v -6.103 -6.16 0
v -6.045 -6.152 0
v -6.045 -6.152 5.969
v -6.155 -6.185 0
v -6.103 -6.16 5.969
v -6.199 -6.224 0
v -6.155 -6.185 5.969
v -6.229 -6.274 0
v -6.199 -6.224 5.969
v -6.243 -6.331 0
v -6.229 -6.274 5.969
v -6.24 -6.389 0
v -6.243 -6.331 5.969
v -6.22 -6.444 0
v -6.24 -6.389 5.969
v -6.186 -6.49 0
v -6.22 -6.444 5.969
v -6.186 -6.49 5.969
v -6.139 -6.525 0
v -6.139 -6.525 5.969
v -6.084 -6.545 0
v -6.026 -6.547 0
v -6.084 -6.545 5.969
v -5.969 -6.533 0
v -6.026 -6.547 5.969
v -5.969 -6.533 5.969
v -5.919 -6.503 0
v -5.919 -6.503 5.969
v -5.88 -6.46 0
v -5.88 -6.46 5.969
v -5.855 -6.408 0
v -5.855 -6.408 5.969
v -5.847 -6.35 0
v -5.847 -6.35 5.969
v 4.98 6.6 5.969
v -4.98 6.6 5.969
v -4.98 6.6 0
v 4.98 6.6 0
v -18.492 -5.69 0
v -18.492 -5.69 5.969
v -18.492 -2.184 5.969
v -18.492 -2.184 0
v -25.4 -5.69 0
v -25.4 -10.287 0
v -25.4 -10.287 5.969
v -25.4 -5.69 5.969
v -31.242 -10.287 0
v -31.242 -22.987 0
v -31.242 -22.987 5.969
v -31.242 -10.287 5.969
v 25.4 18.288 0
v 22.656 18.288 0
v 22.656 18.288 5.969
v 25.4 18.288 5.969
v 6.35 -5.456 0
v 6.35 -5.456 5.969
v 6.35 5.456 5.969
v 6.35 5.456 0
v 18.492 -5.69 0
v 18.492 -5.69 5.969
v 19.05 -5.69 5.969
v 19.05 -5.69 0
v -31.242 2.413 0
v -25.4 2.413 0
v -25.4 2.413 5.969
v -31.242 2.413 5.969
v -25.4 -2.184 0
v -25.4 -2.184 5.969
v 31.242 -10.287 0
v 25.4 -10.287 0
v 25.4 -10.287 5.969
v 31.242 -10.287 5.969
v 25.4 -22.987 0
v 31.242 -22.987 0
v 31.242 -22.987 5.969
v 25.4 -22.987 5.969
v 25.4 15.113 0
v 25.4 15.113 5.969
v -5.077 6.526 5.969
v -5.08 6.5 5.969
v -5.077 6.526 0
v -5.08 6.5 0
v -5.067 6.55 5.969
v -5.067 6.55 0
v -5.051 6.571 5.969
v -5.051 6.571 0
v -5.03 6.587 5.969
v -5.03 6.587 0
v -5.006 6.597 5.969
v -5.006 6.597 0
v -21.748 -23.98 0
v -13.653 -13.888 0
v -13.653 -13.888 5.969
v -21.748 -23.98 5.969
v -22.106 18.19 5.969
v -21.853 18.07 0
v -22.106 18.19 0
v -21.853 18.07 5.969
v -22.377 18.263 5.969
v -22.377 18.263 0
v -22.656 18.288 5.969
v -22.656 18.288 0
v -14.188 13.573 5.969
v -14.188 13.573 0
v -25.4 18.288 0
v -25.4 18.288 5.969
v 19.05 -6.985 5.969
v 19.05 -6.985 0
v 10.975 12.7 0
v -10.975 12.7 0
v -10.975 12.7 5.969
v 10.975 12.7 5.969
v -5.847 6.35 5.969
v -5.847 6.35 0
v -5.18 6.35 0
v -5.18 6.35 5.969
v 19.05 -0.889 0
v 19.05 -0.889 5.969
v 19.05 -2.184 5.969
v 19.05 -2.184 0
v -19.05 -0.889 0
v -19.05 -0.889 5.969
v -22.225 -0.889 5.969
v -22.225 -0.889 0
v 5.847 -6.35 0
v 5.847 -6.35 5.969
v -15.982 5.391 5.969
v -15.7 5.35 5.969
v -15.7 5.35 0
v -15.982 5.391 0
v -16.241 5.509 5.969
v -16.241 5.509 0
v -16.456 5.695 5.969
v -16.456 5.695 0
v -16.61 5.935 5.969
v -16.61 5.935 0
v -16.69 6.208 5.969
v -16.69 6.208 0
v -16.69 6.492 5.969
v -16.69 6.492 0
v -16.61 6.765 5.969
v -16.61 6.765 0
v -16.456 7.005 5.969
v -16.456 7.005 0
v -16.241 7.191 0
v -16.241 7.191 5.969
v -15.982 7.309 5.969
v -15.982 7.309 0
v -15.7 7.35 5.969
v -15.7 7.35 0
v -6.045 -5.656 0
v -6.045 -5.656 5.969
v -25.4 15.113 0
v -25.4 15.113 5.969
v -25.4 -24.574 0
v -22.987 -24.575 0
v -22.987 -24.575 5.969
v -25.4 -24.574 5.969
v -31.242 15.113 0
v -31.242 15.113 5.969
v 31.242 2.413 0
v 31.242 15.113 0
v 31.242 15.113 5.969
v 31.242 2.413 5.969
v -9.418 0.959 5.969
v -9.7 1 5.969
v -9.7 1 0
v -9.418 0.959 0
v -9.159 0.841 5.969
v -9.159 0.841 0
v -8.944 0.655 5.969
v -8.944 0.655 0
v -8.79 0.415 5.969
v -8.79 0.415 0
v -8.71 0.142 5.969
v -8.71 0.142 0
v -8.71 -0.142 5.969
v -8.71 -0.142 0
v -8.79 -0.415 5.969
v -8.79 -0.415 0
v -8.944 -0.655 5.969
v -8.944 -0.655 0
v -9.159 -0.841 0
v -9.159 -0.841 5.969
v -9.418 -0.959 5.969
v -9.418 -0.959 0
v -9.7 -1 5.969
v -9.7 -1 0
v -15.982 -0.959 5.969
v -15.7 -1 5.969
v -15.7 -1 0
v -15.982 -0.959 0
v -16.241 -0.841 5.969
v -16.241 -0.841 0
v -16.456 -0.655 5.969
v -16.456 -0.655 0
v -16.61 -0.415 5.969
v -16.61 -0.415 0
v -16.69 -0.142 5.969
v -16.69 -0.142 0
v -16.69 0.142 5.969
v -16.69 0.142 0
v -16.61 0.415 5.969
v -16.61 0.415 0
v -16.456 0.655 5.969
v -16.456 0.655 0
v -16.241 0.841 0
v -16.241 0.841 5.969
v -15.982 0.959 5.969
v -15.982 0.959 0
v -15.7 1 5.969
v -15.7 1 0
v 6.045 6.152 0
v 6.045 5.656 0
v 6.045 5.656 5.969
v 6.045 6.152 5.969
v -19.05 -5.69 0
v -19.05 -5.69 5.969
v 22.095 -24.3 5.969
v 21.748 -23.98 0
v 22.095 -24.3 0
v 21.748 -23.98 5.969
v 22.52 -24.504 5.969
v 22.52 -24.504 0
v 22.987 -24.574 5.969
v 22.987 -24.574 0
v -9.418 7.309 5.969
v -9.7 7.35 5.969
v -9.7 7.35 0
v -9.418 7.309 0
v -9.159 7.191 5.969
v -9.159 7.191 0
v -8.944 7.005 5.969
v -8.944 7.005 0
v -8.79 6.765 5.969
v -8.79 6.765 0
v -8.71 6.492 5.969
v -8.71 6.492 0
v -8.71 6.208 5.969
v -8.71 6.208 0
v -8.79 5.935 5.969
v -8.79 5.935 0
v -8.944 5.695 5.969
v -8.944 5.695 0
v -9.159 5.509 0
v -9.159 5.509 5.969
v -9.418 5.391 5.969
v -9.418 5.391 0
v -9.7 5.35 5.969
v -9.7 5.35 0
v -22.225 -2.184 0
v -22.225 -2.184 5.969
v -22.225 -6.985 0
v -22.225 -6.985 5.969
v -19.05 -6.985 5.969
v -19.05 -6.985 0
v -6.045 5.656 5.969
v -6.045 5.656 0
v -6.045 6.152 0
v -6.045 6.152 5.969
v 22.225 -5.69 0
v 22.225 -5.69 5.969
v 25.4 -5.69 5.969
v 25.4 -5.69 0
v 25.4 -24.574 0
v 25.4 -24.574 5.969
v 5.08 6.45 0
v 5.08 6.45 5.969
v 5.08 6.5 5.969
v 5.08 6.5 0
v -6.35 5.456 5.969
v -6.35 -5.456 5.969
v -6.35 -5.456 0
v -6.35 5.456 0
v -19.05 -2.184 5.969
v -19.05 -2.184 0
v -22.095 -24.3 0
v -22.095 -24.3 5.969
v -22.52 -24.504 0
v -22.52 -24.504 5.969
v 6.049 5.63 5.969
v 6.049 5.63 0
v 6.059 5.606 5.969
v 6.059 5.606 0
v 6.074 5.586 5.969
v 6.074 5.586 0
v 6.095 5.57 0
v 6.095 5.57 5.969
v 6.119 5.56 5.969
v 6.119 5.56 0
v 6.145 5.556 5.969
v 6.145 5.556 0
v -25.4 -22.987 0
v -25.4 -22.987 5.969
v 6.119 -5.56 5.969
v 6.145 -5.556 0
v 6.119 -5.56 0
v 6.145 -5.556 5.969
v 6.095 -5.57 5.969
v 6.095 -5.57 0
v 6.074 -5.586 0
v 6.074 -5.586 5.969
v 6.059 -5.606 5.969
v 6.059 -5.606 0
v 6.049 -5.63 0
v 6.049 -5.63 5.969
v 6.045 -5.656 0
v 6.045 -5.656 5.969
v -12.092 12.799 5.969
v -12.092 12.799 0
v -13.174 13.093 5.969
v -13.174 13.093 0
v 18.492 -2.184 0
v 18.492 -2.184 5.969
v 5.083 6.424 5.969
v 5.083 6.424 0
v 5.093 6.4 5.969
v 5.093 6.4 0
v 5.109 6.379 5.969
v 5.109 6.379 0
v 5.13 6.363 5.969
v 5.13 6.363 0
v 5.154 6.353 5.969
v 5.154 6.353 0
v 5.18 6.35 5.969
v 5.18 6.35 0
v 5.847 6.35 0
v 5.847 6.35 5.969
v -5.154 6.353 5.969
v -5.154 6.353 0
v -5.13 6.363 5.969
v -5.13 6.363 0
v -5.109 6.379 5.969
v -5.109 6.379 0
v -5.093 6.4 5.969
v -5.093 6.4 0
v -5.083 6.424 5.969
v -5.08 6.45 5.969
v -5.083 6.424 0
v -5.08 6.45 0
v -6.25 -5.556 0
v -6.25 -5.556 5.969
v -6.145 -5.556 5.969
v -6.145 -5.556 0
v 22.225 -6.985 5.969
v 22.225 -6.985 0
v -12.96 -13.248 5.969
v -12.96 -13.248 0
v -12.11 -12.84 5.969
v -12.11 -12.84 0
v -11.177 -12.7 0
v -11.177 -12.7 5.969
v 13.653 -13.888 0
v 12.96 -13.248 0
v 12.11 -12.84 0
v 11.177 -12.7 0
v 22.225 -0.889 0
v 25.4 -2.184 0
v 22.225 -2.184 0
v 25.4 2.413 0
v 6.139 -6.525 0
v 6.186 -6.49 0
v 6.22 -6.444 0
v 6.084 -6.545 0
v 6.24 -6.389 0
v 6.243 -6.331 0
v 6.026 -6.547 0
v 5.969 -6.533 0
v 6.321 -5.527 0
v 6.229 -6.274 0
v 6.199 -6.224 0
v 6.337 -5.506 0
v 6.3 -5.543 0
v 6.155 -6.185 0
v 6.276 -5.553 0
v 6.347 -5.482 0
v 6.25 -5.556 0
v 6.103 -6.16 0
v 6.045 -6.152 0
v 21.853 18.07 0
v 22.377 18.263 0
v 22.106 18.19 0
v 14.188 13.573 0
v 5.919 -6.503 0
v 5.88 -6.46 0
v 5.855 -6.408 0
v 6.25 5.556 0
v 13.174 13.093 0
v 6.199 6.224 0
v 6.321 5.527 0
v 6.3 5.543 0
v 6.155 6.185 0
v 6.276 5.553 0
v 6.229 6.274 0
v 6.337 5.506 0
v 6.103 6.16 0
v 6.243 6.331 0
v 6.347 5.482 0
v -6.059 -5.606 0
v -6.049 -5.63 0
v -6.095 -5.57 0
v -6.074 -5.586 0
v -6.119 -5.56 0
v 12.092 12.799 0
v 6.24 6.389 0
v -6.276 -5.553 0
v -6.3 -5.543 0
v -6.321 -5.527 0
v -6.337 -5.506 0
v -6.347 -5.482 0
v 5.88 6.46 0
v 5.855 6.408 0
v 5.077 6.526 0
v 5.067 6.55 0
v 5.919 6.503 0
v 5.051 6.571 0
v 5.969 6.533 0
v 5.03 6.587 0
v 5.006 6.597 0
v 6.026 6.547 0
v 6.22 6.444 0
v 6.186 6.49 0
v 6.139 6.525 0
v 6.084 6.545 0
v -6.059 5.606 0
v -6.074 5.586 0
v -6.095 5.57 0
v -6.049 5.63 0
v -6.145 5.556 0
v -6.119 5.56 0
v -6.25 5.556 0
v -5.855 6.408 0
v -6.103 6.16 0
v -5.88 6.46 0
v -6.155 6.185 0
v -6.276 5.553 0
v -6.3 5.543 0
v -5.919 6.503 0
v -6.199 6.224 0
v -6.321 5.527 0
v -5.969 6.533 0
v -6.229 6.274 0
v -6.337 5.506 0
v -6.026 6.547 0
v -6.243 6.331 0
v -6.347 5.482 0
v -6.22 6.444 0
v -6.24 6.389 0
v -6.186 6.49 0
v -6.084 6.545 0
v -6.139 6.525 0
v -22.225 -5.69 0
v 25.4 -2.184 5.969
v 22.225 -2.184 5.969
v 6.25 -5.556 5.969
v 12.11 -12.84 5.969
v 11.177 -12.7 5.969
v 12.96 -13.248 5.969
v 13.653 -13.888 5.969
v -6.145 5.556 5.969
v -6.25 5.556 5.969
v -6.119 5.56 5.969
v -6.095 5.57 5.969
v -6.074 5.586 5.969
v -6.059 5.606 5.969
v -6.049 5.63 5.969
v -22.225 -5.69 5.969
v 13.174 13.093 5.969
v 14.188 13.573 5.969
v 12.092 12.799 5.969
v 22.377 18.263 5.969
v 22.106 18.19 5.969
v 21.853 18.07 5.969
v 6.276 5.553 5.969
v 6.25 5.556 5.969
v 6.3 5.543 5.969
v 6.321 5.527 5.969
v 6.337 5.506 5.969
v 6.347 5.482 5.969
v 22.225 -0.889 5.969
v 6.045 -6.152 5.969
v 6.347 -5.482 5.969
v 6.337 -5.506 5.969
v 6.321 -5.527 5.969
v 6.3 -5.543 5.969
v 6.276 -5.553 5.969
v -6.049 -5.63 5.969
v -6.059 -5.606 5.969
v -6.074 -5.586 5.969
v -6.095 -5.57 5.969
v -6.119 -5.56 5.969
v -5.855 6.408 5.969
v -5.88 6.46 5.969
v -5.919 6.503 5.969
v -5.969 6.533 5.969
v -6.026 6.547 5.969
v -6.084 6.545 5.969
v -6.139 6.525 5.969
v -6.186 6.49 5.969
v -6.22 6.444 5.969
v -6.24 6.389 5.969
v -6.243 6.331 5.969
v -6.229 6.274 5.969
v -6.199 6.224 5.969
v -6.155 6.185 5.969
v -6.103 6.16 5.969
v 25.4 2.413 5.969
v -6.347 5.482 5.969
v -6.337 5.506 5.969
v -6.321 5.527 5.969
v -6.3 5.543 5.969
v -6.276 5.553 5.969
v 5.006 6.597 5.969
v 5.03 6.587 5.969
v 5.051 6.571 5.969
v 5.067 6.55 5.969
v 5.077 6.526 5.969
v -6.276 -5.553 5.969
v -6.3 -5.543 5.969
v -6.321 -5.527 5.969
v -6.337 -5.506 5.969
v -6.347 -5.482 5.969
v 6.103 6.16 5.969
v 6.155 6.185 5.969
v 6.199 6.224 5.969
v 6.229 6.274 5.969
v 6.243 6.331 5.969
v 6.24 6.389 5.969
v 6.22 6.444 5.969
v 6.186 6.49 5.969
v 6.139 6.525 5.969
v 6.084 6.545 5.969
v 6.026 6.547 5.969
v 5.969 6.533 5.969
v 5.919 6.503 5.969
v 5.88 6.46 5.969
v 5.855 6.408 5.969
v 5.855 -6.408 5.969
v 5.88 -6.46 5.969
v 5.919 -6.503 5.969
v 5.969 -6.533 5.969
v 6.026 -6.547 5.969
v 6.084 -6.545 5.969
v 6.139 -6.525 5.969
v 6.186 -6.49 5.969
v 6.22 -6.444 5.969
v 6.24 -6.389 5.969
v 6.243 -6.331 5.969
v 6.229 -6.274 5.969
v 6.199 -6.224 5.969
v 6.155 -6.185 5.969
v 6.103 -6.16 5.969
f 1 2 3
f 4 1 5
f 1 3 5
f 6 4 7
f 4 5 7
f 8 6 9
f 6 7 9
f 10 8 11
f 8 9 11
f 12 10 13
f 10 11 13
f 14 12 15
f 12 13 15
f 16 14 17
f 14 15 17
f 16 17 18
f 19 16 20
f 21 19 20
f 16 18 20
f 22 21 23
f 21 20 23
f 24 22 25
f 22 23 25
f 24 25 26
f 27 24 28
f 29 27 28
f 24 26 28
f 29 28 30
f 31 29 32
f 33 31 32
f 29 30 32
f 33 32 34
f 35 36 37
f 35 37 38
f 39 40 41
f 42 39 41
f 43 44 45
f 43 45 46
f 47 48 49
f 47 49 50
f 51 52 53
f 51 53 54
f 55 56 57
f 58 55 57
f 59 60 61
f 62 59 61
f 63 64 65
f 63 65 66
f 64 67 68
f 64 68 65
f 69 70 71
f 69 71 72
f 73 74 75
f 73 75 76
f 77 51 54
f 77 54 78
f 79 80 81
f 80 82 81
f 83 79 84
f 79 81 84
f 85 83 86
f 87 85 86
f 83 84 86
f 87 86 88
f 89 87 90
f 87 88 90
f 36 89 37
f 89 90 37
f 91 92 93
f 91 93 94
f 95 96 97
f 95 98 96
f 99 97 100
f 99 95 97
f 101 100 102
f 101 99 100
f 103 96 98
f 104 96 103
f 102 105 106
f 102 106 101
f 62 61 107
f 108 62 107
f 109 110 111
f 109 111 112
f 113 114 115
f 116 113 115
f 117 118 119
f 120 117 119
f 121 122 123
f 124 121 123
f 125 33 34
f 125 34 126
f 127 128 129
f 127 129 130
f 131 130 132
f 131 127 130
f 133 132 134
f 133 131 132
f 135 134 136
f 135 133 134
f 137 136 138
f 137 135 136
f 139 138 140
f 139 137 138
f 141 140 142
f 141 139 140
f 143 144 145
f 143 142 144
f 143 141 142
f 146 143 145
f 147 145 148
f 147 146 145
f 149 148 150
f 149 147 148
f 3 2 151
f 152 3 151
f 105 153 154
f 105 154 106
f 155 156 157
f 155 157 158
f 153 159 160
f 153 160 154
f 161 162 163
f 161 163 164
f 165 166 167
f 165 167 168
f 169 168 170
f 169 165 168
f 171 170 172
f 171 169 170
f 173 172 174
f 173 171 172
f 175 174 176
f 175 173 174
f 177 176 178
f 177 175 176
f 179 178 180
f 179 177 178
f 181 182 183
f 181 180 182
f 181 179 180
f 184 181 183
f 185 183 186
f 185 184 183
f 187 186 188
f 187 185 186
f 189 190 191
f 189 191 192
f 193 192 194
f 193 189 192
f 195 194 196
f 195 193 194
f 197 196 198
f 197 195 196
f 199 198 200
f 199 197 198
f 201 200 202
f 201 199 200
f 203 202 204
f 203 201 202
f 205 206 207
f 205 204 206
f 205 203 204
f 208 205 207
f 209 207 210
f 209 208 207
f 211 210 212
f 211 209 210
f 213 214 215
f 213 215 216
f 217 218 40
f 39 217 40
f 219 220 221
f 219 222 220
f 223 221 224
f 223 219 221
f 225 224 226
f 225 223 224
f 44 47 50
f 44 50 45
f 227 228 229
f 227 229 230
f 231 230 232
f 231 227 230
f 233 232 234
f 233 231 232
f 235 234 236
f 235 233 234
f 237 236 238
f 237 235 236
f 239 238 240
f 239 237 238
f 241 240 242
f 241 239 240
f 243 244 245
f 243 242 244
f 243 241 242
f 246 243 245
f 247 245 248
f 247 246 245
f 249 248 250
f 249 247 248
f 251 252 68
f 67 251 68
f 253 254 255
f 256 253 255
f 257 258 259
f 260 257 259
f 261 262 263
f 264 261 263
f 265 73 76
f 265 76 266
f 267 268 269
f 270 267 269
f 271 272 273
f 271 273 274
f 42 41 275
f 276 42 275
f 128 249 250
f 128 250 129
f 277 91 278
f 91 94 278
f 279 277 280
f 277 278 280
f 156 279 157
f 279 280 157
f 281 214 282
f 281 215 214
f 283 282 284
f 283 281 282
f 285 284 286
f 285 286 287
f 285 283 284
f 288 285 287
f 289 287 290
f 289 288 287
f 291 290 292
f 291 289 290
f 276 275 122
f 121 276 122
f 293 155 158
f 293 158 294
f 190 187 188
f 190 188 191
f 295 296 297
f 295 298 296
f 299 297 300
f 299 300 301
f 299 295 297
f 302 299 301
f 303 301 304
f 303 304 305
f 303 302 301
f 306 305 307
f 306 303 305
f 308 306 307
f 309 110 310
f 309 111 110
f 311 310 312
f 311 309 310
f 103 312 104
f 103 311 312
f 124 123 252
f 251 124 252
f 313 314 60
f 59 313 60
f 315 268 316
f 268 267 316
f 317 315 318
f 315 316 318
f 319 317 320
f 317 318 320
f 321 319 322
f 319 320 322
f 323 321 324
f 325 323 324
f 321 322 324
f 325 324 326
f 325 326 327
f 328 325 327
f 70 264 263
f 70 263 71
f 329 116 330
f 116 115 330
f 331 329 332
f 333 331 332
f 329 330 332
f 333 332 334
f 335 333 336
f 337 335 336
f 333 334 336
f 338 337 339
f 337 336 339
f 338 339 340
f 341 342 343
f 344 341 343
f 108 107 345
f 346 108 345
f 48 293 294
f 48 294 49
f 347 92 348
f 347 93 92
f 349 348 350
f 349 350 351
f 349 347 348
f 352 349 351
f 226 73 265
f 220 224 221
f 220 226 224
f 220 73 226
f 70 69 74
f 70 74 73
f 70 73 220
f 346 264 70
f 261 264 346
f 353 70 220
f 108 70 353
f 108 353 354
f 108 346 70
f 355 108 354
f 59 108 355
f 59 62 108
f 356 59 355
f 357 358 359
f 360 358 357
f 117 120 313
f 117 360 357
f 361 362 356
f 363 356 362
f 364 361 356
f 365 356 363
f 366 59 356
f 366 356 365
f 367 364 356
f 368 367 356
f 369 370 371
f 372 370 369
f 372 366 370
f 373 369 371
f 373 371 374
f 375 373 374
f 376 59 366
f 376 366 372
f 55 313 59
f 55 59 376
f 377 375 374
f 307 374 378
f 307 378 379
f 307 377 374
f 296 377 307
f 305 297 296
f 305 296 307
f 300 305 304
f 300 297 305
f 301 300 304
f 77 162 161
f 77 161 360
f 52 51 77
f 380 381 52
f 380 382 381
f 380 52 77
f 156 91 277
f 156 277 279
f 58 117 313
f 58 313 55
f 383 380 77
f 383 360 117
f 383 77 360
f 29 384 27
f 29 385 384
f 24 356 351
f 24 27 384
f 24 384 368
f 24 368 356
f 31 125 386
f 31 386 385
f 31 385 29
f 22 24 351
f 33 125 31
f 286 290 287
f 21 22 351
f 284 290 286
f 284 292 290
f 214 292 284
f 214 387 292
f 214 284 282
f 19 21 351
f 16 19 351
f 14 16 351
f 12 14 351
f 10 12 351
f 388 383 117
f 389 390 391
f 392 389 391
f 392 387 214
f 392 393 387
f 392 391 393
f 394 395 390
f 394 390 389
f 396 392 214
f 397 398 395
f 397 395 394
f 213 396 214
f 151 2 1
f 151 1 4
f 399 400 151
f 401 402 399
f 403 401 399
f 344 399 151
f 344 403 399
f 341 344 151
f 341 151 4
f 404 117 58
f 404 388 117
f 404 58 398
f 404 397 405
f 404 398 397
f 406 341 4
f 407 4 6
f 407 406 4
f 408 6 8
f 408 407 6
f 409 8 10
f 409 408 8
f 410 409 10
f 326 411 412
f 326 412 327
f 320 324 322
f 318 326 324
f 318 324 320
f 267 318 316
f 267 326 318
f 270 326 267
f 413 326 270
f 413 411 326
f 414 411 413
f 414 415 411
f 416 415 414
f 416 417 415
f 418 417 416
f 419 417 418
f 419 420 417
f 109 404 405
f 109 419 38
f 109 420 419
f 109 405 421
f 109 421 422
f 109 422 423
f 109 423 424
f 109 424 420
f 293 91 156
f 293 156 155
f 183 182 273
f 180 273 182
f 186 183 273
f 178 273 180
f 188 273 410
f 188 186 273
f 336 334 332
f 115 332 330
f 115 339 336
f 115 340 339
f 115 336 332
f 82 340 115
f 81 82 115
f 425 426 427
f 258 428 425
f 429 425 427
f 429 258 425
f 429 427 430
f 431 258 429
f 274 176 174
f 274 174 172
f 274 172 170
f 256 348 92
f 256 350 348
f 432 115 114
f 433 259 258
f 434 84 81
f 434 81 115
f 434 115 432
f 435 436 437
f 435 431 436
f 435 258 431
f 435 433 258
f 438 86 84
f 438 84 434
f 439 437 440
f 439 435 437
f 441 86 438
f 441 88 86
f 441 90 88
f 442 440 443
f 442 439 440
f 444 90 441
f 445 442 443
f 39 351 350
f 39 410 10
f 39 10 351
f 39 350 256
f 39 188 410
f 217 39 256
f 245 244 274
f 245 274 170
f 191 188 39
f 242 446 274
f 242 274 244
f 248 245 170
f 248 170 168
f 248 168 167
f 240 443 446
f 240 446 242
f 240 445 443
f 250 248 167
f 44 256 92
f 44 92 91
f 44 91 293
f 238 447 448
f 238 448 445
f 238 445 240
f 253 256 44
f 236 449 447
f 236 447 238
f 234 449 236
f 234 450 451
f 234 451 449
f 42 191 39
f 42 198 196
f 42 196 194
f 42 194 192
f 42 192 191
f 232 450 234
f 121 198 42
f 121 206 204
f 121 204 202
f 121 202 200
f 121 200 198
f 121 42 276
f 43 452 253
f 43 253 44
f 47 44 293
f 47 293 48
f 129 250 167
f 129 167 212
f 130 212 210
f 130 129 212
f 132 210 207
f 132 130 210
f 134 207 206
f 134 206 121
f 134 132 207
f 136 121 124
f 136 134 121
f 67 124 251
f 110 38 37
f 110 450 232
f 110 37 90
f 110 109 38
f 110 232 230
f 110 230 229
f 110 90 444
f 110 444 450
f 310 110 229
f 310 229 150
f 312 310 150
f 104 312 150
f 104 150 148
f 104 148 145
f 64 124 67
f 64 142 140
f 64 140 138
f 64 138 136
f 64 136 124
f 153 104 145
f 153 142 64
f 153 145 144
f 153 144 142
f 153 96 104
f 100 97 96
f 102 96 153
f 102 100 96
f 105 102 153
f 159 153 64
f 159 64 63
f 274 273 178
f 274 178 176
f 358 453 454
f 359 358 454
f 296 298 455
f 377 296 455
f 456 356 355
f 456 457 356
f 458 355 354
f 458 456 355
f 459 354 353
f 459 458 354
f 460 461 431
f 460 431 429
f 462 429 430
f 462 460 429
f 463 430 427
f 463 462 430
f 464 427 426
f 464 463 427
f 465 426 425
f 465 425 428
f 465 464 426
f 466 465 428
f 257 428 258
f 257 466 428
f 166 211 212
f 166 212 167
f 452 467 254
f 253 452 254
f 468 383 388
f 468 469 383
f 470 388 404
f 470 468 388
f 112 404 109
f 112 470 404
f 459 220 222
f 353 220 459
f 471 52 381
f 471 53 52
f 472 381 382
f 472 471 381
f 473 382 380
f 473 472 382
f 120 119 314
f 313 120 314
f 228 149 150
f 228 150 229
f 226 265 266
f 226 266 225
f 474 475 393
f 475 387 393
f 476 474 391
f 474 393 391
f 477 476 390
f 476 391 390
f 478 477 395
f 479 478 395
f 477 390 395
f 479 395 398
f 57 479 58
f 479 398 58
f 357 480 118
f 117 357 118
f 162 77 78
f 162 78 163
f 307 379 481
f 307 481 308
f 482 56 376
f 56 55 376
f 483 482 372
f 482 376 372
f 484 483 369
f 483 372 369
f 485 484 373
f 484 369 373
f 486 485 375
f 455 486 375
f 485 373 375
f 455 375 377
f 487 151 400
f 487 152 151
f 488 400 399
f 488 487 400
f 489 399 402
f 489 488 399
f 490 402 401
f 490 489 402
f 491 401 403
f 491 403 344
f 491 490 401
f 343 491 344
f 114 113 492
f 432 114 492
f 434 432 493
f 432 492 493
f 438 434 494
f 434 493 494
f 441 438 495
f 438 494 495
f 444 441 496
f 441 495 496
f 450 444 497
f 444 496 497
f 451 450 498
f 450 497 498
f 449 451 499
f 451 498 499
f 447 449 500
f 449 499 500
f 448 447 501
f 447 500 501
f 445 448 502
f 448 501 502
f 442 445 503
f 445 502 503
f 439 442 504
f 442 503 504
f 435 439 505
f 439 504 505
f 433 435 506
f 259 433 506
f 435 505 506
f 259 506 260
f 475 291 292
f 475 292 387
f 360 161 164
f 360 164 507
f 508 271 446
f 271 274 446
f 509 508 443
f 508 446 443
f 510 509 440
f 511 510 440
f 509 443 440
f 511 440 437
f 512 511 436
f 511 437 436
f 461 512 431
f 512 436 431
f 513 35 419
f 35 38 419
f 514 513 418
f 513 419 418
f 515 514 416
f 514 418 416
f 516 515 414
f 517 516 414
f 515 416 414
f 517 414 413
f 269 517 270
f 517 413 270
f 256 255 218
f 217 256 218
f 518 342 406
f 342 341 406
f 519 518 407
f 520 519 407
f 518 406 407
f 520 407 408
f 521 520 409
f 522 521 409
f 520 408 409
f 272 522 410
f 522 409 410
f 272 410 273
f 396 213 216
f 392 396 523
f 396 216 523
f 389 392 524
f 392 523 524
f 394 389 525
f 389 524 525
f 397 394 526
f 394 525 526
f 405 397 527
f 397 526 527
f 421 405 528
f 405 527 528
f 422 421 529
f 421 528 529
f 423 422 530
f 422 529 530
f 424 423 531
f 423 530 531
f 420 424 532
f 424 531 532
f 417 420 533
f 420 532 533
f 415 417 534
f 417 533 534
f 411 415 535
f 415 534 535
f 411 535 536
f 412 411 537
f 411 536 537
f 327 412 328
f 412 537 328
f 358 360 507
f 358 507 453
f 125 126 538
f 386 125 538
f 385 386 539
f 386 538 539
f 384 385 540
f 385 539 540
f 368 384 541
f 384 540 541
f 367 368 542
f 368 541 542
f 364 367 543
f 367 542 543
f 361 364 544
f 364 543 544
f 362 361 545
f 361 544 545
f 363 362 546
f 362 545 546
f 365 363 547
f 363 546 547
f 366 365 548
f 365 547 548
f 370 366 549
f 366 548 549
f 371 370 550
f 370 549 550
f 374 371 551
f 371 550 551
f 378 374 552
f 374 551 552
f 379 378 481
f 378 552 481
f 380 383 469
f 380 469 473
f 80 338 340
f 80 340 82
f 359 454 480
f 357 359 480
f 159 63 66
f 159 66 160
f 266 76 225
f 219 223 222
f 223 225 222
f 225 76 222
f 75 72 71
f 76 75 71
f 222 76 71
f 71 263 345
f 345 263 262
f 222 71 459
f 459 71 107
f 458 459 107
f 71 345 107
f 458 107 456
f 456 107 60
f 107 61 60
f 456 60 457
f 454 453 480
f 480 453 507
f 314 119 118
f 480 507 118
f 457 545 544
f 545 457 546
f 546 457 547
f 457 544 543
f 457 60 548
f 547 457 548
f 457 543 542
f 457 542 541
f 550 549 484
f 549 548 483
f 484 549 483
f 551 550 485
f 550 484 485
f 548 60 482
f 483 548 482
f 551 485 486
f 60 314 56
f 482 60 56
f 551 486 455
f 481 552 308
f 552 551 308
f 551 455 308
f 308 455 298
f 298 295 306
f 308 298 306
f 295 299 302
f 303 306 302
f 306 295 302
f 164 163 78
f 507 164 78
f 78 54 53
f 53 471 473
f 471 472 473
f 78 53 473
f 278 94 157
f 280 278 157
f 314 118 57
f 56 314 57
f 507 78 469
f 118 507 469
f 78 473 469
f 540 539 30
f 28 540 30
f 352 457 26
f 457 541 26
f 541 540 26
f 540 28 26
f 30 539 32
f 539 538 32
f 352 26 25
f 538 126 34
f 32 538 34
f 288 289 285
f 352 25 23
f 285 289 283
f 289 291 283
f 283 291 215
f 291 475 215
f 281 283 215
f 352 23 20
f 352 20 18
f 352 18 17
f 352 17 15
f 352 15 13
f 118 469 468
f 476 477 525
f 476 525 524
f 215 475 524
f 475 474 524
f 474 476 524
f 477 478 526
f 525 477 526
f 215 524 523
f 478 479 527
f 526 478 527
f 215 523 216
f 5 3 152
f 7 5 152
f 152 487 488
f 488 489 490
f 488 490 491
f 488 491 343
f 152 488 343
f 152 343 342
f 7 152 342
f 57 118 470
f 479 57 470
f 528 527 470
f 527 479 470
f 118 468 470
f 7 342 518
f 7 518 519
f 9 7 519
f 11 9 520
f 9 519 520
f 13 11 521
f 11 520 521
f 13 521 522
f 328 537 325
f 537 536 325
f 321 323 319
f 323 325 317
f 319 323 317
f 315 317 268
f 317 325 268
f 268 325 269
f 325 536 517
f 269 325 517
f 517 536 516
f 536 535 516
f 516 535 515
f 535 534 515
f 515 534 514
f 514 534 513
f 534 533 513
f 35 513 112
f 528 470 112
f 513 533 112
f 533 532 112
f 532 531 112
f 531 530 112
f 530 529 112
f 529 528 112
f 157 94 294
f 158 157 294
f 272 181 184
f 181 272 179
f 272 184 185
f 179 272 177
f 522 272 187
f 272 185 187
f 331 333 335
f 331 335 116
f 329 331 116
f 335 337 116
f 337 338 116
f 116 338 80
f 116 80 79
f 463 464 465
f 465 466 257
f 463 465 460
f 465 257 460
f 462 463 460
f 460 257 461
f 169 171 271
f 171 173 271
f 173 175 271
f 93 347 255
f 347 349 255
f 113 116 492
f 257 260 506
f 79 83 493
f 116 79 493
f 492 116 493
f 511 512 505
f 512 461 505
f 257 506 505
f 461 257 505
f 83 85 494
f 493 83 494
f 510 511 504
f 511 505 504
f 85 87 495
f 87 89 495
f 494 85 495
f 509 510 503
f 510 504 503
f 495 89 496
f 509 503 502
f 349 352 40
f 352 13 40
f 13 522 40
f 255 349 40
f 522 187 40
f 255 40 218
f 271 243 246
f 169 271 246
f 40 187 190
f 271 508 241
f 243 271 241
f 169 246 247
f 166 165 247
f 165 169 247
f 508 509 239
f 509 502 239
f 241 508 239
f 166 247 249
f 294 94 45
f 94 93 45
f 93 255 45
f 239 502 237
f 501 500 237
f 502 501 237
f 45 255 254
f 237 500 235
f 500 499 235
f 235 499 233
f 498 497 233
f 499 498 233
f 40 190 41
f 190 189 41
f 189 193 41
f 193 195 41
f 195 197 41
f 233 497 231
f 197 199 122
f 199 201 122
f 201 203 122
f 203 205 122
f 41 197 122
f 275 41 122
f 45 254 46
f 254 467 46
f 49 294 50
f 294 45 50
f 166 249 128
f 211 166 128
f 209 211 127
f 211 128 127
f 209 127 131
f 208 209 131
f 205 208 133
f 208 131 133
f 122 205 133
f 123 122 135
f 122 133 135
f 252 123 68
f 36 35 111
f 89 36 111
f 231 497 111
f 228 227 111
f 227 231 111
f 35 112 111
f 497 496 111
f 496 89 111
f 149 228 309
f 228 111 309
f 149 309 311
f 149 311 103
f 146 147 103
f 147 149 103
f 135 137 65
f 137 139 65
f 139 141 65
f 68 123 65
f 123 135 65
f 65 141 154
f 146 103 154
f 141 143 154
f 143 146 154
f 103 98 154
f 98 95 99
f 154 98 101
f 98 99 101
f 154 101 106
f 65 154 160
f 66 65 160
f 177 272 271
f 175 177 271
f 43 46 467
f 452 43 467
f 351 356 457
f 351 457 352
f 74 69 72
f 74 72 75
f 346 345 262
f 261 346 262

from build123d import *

# Parameters (mm, degrees)
SKETCH1_W           = 12.0904
SKETCH1_H           = 12.7
BOSS_EXTRUDE1_DEPTH = 5.969
CUT_EXTRUDE1_DEPTH  = 41.194496828
SKETCH3_R           = 0.1984375
CUT_EXTRUDE2_DEPTH  = 41.194496828
FILLET1_R           = 3.175
FILLET2_R           = 1.5875
SKETCH4_W           = 12.7
SKETCH4_H           = 11.1125
CUT_EXTRUDE3_DEPTH  = 41.194496828
FILLET7_R           = 0.1
SKETCH5_W           = 10.16
SKETCH5_H           = 0.5
CUT_EXTRUDE4_DEPTH  = 41.194496828
FILLET8_R           = 0.1
CUT_EXTRUDE5_DEPTH  = 41.194496828
FILLET9_R           = 6.35


with BuildPart() as part:
    # Sketch1 → Boss-Extrude1 (new body)
    with BuildSketch(Plane.XY):
        Polygon((25.4, 2.413), (25.4, -10.287), (31.242, -10.287), (31.242, -22.987), (25.4, -22.987), (25.4, -24.5745), (22.225, -24.5745), (12.7, -12.7), (-12.7, -12.7), (-22.225, -24.5745), (-25.4, -24.5745), (-25.4, -22.987), (-31.242, -22.987), (-31.242, -10.287), (-25.4, -10.287), (-25.4, 2.413), (-31.242, 2.413), (-31.242, 15.113), (-25.4, 15.113), (-25.4, 18.288), (-22.225, 18.288), (-12.7, 12.7), (12.7, 12.7), (22.225, 18.288), (25.4, 18.288), (25.4, 15.113), (31.242, 15.113), (31.242, 2.413), align=None)
        Rectangle(SKETCH1_W, SKETCH1_H, mode=Mode.SUBTRACT)
    extrude(amount=BOSS_EXTRUDE1_DEPTH)

    # Sketch2 → Cut-Extrude1 (cut, through all)
    with BuildSketch(Plane.XY.offset(5.969)):
        Polygon((22.225, -2.1844), (22.225, -0.889), (19.05, -0.889), (19.05, -2.1844), (18.492, -2.1844), (18.492, -5.6896), (19.05, -5.6896), (19.05, -6.985), (22.225, -6.985), (22.225, -5.6896), (25.4, -5.6896), (25.4, -2.1844), align=None)
        Polygon((-19.05, -2.1844), (-19.05, -0.889), (-22.225, -0.889), (-22.225, -2.1844), (-25.4, -2.1844), (-25.4, -5.6896), (-22.225, -5.6896), (-22.225, -6.985), (-19.05, -6.985), (-19.05, -5.6896), (-18.492, -5.6896), (-18.492, -2.1844), align=None)
    extrude(amount=-CUT_EXTRUDE1_DEPTH, mode=Mode.SUBTRACT)

    # Sketch3 → Cut-Extrude2 (cut, through all)
    with BuildSketch(Plane.XY.offset(5.969)):
        with Locations((6.0452, 6.35)):
            Circle(SKETCH3_R)
        with Locations((-6.0452, 6.35)):
            Circle(SKETCH3_R)
        with Locations((-6.0452, -6.35)):
            Circle(SKETCH3_R)
        with Locations((6.0452, -6.35)):
            Circle(SKETCH3_R)
    extrude(amount=-CUT_EXTRUDE2_DEPTH, mode=Mode.SUBTRACT)

    # Fillet1
    fillet1_edges = [part.edges().sort_by_distance(p)[0] for p in [
        (12.7, -12.7, 2.9845),
        (-12.7, -12.7, 2.9845),
    ]]
    fillet(fillet1_edges, radius=FILLET1_R)

    # Fillet2
    fillet2_edges = [part.edges().sort_by_distance(p)[0] for p in [
        (22.225, -24.5745, 2.9845),
        (-22.225, -24.5745, 2.9845),
        (-22.225, 18.288, 2.9845),
        (22.225, 18.288, 2.9845),
    ]]
    fillet(fillet2_edges, radius=FILLET2_R)

    # Sketch4 → Cut-Extrude3 (cut, through all)
    with BuildSketch(Plane.XY.offset(5.969)):
        Rectangle(SKETCH4_W, SKETCH4_H)
    extrude(amount=-CUT_EXTRUDE3_DEPTH, mode=Mode.SUBTRACT)

    # Fillet7
    fillet7_edges = [part.edges().sort_by_distance(p)[0] for p in [
        (6.0452, -5.55625, 2.9845),
        (6.0452, 5.55625, 2.9845),
        (-6.0452, 5.55625, 2.9845),
        (-6.35, 5.55625, 2.9845),
        (-6.0452, -5.55625, 2.9845),
        (-6.35, -5.55625, 2.9845),
        (6.35, 5.55625, 2.9845),
        (6.35, -5.55625, 2.9845),
    ]]
    fillet(fillet7_edges, radius=FILLET7_R)

    # Sketch5 → Cut-Extrude4 (cut, through all)
    with BuildSketch(Plane.XY.offset(5.969)):
        with Locations((0, 6.35)):
            Rectangle(SKETCH5_W, SKETCH5_H)
    extrude(amount=-CUT_EXTRUDE4_DEPTH, mode=Mode.SUBTRACT)

    # Fillet8
    fillet8_edges = [part.edges().sort_by_distance(p)[0] for p in [
        (5.08, 6.35, 2.9845),
        (-5.08, 6.35, 2.9845),
        (-5.08, 6.6, 2.9845),
        (5.08, 6.6, 2.9845),
    ]]
    fillet(fillet8_edges, radius=FILLET8_R)

    # Sketch6 → Cut-Extrude5 (cut, through all)
    with BuildSketch(Plane.XY.offset(5.969)):
        with BuildLine():
            Line((-15.7, 7.35), (-9.7, 7.35))
            ThreePointArc((-9.7, 7.35), (-8.7, 6.35), (-9.7, 5.35))
            Line((-9.7, 5.35), (-15.7, 5.35))
            ThreePointArc((-15.7, 5.35), (-16.7, 6.35), (-15.7, 7.35))
        make_face()
        with BuildLine():
            Line((-15.7, 1), (-9.7, 1))
            ThreePointArc((-9.7, 1), (-8.7, 0), (-9.7, -1))
            Line((-9.7, -1), (-15.7, -1))
            ThreePointArc((-15.7, -1), (-16.7, 0), (-15.7, 1))
        make_face()
    extrude(amount=-CUT_EXTRUDE5_DEPTH, mode=Mode.SUBTRACT)

    # Fillet9
    fillet9_edges = [part.edges().sort_by_distance(p)[0] for p in [
        (-12.7, 12.7, 2.9845),
        (12.7, 12.7, 2.9845),
    ]]
    fillet(fillet9_edges, radius=FILLET9_R)


solid = part.part
